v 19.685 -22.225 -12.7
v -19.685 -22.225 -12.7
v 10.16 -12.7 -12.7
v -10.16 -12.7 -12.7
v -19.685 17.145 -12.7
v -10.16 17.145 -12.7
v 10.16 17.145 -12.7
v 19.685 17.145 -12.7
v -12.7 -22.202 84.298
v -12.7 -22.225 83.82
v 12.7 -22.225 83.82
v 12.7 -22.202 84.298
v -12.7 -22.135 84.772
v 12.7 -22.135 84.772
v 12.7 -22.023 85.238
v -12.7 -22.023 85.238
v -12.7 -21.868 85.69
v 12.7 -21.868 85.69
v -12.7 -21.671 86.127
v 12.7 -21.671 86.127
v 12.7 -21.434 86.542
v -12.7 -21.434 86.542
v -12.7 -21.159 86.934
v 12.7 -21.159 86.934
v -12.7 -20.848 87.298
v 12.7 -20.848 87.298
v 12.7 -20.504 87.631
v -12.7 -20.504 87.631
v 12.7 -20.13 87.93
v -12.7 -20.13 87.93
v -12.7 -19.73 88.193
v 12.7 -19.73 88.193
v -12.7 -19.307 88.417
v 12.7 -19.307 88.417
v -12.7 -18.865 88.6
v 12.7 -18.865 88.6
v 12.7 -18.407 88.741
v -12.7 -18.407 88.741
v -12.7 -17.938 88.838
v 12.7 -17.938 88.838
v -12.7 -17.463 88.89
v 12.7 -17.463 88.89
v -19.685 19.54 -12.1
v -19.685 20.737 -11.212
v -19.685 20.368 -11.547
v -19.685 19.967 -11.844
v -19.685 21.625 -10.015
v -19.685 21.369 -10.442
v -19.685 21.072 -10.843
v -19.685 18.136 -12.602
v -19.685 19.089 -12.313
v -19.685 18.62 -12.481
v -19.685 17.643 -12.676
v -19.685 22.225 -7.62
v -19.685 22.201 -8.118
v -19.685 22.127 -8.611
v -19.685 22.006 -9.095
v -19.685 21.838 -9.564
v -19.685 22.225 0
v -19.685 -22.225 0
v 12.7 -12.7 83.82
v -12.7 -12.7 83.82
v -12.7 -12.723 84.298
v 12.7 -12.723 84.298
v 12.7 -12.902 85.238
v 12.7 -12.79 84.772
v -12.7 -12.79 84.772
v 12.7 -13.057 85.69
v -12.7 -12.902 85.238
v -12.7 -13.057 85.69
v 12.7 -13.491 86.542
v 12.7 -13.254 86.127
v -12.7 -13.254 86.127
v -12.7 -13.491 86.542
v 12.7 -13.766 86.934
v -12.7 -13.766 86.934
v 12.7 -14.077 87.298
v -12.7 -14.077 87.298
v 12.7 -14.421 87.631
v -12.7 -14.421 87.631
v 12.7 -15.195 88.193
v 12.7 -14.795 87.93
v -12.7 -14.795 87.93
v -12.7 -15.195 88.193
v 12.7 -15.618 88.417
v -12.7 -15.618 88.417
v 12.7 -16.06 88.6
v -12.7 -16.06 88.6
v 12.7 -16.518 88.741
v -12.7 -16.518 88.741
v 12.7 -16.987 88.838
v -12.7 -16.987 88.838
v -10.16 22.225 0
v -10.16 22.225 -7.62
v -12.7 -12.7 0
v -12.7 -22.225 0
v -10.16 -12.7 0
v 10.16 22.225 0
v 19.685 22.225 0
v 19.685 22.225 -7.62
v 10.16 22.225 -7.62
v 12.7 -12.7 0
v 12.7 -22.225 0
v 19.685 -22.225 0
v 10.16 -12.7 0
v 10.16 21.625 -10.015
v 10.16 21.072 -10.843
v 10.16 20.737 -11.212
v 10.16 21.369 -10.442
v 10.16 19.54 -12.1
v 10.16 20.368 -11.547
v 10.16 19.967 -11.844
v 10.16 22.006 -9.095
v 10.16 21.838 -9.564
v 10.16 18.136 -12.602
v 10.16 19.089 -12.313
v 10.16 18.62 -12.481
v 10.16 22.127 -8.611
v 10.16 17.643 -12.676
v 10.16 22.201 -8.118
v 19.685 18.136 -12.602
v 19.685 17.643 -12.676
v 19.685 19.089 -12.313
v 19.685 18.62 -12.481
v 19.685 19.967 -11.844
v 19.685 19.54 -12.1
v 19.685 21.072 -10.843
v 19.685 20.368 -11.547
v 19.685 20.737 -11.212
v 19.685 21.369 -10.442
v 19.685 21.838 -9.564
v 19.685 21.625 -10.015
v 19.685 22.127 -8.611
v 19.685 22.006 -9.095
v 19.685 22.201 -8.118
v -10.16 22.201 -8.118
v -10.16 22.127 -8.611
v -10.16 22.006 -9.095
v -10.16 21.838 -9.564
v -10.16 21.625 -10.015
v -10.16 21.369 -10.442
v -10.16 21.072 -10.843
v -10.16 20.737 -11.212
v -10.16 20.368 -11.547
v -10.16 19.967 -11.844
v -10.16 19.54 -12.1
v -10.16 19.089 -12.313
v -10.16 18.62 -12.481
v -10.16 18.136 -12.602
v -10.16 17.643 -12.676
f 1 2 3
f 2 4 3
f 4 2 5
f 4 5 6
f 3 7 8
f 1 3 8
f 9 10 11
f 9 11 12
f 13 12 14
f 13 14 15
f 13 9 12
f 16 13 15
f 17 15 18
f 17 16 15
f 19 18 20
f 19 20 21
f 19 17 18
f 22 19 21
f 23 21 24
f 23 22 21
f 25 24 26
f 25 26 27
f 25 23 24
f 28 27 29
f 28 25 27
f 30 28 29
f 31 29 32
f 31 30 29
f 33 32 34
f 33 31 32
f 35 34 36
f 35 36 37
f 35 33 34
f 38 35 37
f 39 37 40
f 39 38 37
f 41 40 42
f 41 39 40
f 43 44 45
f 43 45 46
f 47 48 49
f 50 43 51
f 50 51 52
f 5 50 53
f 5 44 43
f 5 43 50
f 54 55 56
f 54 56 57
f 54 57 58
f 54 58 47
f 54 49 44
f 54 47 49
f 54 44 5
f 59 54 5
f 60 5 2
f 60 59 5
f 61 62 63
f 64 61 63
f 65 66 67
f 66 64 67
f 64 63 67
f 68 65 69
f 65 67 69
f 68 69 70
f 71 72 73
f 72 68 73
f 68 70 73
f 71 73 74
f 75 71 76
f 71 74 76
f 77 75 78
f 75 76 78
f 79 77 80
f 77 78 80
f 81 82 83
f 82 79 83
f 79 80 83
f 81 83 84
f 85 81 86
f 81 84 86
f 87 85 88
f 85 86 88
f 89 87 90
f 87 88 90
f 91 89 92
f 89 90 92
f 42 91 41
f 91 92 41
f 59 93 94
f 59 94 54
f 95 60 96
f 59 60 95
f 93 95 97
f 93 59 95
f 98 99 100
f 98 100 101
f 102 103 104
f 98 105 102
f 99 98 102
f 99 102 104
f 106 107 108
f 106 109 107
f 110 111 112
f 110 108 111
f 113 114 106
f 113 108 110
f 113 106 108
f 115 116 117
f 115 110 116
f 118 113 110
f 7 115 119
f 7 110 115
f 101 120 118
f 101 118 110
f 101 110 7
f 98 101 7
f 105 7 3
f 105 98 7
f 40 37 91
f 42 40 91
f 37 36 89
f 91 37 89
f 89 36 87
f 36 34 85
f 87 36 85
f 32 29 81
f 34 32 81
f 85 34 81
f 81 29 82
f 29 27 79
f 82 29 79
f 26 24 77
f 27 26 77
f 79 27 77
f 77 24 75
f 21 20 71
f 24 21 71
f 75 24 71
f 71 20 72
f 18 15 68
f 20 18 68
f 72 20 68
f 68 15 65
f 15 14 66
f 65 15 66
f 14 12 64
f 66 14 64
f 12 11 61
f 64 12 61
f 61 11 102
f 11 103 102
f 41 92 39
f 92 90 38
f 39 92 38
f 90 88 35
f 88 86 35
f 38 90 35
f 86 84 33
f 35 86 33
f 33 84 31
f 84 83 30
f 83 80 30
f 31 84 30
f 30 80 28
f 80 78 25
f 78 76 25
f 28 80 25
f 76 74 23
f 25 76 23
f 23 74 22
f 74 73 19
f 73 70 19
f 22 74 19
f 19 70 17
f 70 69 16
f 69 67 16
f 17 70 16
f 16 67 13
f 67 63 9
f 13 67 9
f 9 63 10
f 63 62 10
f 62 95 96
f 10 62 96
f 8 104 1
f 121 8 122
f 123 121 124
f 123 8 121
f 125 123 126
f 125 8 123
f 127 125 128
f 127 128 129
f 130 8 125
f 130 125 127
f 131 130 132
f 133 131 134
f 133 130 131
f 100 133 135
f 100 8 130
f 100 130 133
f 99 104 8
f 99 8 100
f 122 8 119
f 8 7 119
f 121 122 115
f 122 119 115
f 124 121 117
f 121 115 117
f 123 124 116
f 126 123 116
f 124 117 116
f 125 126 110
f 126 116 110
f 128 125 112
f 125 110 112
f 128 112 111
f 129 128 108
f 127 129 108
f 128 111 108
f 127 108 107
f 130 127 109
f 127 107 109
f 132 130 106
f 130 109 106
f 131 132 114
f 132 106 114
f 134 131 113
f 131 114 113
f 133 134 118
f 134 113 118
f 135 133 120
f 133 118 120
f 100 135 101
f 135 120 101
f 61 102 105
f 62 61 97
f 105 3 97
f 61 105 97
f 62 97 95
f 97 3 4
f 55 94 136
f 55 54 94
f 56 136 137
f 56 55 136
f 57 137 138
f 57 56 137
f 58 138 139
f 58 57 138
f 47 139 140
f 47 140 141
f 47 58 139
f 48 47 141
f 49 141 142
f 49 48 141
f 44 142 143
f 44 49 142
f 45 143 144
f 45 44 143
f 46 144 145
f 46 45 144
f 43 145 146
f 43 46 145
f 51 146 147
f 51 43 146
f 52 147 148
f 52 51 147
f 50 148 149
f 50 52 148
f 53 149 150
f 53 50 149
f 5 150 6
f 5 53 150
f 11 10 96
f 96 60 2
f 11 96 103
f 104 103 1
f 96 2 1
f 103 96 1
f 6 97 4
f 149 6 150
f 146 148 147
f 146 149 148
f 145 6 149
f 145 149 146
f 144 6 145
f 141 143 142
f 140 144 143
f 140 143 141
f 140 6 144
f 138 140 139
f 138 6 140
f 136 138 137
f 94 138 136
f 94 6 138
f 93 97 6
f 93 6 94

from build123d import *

# Parameters (mm, degrees)
F1_DEPTH    = 12.7
F3_DEPTH    = 88.9
F4_T1_DEPTH = 50.8
F5_R        = 5.08


# Not quite as in the source:
# - a fillet or chamfer that OpenCascade refuses, or shapes differently, is made with other operations: its cross-section is extruded or revolved along the edge and cut away or added
# - a feature names something its author has since deleted; it is built from what else it names


with BuildPart() as f1:
    # F0 (on Top) → F1 (new body)
    with BuildSketch(Plane.XY):
        Polygon((10.16, 12.7), (10.16, -12.7), (-10.16, -12.7), (-10.16, 12.7), (-10.16, 22.225), (-19.685, 22.225), (-19.685, -22.225), (19.685, -22.225), (19.685, 22.225), (10.16, 22.225), align=None)
    extrude(amount=-F1_DEPTH)

    # F2 (on face) → F3 (join)
    with BuildSketch(Plane.XY):
        Polygon((-12.7, -12.7), (-12.7, -22.225), (12.7, -22.225), (12.7, -12.7), (10.16, -12.7), (-10.16, -12.7), align=None)
    extrude(amount=F3_DEPTH)

    # F4: fillet of radius 5.08 on 2 edges, made by hand

    # F4_s2 → F4_t1 (cut)
    with BuildSketch(Plane.YZ.offset(-25.4)):
        with BuildLine():
            ThreePointArc((-12.7, 83.82), (-14.1878975516, 87.4121024484), (-17.78, 88.9))
            Line((-17.78, 88.9), (-12.7, 88.9))
            Line((-12.7, 88.9), (-12.7, 83.82))
        make_face()
        with BuildLine():
            ThreePointArc((-22.225, 83.82), (-20.7371024484, 87.4121024484), (-17.145, 88.9))
            Line((-17.145, 88.9), (-22.225, 88.9))
            Line((-22.225, 88.9), (-22.225, 83.82))
        make_face()
    extrude(amount=F4_T1_DEPTH, mode=Mode.SUBTRACT)

    # F5
    f5_edges = [f1.edges().sort_by_distance(p)[0] for p in [
        (14.9225, 22.225, -12.7),
        (-14.9225, 22.225, -12.7),
    ]]
    fillet(f5_edges, radius=F5_R)


solid = f1.part
